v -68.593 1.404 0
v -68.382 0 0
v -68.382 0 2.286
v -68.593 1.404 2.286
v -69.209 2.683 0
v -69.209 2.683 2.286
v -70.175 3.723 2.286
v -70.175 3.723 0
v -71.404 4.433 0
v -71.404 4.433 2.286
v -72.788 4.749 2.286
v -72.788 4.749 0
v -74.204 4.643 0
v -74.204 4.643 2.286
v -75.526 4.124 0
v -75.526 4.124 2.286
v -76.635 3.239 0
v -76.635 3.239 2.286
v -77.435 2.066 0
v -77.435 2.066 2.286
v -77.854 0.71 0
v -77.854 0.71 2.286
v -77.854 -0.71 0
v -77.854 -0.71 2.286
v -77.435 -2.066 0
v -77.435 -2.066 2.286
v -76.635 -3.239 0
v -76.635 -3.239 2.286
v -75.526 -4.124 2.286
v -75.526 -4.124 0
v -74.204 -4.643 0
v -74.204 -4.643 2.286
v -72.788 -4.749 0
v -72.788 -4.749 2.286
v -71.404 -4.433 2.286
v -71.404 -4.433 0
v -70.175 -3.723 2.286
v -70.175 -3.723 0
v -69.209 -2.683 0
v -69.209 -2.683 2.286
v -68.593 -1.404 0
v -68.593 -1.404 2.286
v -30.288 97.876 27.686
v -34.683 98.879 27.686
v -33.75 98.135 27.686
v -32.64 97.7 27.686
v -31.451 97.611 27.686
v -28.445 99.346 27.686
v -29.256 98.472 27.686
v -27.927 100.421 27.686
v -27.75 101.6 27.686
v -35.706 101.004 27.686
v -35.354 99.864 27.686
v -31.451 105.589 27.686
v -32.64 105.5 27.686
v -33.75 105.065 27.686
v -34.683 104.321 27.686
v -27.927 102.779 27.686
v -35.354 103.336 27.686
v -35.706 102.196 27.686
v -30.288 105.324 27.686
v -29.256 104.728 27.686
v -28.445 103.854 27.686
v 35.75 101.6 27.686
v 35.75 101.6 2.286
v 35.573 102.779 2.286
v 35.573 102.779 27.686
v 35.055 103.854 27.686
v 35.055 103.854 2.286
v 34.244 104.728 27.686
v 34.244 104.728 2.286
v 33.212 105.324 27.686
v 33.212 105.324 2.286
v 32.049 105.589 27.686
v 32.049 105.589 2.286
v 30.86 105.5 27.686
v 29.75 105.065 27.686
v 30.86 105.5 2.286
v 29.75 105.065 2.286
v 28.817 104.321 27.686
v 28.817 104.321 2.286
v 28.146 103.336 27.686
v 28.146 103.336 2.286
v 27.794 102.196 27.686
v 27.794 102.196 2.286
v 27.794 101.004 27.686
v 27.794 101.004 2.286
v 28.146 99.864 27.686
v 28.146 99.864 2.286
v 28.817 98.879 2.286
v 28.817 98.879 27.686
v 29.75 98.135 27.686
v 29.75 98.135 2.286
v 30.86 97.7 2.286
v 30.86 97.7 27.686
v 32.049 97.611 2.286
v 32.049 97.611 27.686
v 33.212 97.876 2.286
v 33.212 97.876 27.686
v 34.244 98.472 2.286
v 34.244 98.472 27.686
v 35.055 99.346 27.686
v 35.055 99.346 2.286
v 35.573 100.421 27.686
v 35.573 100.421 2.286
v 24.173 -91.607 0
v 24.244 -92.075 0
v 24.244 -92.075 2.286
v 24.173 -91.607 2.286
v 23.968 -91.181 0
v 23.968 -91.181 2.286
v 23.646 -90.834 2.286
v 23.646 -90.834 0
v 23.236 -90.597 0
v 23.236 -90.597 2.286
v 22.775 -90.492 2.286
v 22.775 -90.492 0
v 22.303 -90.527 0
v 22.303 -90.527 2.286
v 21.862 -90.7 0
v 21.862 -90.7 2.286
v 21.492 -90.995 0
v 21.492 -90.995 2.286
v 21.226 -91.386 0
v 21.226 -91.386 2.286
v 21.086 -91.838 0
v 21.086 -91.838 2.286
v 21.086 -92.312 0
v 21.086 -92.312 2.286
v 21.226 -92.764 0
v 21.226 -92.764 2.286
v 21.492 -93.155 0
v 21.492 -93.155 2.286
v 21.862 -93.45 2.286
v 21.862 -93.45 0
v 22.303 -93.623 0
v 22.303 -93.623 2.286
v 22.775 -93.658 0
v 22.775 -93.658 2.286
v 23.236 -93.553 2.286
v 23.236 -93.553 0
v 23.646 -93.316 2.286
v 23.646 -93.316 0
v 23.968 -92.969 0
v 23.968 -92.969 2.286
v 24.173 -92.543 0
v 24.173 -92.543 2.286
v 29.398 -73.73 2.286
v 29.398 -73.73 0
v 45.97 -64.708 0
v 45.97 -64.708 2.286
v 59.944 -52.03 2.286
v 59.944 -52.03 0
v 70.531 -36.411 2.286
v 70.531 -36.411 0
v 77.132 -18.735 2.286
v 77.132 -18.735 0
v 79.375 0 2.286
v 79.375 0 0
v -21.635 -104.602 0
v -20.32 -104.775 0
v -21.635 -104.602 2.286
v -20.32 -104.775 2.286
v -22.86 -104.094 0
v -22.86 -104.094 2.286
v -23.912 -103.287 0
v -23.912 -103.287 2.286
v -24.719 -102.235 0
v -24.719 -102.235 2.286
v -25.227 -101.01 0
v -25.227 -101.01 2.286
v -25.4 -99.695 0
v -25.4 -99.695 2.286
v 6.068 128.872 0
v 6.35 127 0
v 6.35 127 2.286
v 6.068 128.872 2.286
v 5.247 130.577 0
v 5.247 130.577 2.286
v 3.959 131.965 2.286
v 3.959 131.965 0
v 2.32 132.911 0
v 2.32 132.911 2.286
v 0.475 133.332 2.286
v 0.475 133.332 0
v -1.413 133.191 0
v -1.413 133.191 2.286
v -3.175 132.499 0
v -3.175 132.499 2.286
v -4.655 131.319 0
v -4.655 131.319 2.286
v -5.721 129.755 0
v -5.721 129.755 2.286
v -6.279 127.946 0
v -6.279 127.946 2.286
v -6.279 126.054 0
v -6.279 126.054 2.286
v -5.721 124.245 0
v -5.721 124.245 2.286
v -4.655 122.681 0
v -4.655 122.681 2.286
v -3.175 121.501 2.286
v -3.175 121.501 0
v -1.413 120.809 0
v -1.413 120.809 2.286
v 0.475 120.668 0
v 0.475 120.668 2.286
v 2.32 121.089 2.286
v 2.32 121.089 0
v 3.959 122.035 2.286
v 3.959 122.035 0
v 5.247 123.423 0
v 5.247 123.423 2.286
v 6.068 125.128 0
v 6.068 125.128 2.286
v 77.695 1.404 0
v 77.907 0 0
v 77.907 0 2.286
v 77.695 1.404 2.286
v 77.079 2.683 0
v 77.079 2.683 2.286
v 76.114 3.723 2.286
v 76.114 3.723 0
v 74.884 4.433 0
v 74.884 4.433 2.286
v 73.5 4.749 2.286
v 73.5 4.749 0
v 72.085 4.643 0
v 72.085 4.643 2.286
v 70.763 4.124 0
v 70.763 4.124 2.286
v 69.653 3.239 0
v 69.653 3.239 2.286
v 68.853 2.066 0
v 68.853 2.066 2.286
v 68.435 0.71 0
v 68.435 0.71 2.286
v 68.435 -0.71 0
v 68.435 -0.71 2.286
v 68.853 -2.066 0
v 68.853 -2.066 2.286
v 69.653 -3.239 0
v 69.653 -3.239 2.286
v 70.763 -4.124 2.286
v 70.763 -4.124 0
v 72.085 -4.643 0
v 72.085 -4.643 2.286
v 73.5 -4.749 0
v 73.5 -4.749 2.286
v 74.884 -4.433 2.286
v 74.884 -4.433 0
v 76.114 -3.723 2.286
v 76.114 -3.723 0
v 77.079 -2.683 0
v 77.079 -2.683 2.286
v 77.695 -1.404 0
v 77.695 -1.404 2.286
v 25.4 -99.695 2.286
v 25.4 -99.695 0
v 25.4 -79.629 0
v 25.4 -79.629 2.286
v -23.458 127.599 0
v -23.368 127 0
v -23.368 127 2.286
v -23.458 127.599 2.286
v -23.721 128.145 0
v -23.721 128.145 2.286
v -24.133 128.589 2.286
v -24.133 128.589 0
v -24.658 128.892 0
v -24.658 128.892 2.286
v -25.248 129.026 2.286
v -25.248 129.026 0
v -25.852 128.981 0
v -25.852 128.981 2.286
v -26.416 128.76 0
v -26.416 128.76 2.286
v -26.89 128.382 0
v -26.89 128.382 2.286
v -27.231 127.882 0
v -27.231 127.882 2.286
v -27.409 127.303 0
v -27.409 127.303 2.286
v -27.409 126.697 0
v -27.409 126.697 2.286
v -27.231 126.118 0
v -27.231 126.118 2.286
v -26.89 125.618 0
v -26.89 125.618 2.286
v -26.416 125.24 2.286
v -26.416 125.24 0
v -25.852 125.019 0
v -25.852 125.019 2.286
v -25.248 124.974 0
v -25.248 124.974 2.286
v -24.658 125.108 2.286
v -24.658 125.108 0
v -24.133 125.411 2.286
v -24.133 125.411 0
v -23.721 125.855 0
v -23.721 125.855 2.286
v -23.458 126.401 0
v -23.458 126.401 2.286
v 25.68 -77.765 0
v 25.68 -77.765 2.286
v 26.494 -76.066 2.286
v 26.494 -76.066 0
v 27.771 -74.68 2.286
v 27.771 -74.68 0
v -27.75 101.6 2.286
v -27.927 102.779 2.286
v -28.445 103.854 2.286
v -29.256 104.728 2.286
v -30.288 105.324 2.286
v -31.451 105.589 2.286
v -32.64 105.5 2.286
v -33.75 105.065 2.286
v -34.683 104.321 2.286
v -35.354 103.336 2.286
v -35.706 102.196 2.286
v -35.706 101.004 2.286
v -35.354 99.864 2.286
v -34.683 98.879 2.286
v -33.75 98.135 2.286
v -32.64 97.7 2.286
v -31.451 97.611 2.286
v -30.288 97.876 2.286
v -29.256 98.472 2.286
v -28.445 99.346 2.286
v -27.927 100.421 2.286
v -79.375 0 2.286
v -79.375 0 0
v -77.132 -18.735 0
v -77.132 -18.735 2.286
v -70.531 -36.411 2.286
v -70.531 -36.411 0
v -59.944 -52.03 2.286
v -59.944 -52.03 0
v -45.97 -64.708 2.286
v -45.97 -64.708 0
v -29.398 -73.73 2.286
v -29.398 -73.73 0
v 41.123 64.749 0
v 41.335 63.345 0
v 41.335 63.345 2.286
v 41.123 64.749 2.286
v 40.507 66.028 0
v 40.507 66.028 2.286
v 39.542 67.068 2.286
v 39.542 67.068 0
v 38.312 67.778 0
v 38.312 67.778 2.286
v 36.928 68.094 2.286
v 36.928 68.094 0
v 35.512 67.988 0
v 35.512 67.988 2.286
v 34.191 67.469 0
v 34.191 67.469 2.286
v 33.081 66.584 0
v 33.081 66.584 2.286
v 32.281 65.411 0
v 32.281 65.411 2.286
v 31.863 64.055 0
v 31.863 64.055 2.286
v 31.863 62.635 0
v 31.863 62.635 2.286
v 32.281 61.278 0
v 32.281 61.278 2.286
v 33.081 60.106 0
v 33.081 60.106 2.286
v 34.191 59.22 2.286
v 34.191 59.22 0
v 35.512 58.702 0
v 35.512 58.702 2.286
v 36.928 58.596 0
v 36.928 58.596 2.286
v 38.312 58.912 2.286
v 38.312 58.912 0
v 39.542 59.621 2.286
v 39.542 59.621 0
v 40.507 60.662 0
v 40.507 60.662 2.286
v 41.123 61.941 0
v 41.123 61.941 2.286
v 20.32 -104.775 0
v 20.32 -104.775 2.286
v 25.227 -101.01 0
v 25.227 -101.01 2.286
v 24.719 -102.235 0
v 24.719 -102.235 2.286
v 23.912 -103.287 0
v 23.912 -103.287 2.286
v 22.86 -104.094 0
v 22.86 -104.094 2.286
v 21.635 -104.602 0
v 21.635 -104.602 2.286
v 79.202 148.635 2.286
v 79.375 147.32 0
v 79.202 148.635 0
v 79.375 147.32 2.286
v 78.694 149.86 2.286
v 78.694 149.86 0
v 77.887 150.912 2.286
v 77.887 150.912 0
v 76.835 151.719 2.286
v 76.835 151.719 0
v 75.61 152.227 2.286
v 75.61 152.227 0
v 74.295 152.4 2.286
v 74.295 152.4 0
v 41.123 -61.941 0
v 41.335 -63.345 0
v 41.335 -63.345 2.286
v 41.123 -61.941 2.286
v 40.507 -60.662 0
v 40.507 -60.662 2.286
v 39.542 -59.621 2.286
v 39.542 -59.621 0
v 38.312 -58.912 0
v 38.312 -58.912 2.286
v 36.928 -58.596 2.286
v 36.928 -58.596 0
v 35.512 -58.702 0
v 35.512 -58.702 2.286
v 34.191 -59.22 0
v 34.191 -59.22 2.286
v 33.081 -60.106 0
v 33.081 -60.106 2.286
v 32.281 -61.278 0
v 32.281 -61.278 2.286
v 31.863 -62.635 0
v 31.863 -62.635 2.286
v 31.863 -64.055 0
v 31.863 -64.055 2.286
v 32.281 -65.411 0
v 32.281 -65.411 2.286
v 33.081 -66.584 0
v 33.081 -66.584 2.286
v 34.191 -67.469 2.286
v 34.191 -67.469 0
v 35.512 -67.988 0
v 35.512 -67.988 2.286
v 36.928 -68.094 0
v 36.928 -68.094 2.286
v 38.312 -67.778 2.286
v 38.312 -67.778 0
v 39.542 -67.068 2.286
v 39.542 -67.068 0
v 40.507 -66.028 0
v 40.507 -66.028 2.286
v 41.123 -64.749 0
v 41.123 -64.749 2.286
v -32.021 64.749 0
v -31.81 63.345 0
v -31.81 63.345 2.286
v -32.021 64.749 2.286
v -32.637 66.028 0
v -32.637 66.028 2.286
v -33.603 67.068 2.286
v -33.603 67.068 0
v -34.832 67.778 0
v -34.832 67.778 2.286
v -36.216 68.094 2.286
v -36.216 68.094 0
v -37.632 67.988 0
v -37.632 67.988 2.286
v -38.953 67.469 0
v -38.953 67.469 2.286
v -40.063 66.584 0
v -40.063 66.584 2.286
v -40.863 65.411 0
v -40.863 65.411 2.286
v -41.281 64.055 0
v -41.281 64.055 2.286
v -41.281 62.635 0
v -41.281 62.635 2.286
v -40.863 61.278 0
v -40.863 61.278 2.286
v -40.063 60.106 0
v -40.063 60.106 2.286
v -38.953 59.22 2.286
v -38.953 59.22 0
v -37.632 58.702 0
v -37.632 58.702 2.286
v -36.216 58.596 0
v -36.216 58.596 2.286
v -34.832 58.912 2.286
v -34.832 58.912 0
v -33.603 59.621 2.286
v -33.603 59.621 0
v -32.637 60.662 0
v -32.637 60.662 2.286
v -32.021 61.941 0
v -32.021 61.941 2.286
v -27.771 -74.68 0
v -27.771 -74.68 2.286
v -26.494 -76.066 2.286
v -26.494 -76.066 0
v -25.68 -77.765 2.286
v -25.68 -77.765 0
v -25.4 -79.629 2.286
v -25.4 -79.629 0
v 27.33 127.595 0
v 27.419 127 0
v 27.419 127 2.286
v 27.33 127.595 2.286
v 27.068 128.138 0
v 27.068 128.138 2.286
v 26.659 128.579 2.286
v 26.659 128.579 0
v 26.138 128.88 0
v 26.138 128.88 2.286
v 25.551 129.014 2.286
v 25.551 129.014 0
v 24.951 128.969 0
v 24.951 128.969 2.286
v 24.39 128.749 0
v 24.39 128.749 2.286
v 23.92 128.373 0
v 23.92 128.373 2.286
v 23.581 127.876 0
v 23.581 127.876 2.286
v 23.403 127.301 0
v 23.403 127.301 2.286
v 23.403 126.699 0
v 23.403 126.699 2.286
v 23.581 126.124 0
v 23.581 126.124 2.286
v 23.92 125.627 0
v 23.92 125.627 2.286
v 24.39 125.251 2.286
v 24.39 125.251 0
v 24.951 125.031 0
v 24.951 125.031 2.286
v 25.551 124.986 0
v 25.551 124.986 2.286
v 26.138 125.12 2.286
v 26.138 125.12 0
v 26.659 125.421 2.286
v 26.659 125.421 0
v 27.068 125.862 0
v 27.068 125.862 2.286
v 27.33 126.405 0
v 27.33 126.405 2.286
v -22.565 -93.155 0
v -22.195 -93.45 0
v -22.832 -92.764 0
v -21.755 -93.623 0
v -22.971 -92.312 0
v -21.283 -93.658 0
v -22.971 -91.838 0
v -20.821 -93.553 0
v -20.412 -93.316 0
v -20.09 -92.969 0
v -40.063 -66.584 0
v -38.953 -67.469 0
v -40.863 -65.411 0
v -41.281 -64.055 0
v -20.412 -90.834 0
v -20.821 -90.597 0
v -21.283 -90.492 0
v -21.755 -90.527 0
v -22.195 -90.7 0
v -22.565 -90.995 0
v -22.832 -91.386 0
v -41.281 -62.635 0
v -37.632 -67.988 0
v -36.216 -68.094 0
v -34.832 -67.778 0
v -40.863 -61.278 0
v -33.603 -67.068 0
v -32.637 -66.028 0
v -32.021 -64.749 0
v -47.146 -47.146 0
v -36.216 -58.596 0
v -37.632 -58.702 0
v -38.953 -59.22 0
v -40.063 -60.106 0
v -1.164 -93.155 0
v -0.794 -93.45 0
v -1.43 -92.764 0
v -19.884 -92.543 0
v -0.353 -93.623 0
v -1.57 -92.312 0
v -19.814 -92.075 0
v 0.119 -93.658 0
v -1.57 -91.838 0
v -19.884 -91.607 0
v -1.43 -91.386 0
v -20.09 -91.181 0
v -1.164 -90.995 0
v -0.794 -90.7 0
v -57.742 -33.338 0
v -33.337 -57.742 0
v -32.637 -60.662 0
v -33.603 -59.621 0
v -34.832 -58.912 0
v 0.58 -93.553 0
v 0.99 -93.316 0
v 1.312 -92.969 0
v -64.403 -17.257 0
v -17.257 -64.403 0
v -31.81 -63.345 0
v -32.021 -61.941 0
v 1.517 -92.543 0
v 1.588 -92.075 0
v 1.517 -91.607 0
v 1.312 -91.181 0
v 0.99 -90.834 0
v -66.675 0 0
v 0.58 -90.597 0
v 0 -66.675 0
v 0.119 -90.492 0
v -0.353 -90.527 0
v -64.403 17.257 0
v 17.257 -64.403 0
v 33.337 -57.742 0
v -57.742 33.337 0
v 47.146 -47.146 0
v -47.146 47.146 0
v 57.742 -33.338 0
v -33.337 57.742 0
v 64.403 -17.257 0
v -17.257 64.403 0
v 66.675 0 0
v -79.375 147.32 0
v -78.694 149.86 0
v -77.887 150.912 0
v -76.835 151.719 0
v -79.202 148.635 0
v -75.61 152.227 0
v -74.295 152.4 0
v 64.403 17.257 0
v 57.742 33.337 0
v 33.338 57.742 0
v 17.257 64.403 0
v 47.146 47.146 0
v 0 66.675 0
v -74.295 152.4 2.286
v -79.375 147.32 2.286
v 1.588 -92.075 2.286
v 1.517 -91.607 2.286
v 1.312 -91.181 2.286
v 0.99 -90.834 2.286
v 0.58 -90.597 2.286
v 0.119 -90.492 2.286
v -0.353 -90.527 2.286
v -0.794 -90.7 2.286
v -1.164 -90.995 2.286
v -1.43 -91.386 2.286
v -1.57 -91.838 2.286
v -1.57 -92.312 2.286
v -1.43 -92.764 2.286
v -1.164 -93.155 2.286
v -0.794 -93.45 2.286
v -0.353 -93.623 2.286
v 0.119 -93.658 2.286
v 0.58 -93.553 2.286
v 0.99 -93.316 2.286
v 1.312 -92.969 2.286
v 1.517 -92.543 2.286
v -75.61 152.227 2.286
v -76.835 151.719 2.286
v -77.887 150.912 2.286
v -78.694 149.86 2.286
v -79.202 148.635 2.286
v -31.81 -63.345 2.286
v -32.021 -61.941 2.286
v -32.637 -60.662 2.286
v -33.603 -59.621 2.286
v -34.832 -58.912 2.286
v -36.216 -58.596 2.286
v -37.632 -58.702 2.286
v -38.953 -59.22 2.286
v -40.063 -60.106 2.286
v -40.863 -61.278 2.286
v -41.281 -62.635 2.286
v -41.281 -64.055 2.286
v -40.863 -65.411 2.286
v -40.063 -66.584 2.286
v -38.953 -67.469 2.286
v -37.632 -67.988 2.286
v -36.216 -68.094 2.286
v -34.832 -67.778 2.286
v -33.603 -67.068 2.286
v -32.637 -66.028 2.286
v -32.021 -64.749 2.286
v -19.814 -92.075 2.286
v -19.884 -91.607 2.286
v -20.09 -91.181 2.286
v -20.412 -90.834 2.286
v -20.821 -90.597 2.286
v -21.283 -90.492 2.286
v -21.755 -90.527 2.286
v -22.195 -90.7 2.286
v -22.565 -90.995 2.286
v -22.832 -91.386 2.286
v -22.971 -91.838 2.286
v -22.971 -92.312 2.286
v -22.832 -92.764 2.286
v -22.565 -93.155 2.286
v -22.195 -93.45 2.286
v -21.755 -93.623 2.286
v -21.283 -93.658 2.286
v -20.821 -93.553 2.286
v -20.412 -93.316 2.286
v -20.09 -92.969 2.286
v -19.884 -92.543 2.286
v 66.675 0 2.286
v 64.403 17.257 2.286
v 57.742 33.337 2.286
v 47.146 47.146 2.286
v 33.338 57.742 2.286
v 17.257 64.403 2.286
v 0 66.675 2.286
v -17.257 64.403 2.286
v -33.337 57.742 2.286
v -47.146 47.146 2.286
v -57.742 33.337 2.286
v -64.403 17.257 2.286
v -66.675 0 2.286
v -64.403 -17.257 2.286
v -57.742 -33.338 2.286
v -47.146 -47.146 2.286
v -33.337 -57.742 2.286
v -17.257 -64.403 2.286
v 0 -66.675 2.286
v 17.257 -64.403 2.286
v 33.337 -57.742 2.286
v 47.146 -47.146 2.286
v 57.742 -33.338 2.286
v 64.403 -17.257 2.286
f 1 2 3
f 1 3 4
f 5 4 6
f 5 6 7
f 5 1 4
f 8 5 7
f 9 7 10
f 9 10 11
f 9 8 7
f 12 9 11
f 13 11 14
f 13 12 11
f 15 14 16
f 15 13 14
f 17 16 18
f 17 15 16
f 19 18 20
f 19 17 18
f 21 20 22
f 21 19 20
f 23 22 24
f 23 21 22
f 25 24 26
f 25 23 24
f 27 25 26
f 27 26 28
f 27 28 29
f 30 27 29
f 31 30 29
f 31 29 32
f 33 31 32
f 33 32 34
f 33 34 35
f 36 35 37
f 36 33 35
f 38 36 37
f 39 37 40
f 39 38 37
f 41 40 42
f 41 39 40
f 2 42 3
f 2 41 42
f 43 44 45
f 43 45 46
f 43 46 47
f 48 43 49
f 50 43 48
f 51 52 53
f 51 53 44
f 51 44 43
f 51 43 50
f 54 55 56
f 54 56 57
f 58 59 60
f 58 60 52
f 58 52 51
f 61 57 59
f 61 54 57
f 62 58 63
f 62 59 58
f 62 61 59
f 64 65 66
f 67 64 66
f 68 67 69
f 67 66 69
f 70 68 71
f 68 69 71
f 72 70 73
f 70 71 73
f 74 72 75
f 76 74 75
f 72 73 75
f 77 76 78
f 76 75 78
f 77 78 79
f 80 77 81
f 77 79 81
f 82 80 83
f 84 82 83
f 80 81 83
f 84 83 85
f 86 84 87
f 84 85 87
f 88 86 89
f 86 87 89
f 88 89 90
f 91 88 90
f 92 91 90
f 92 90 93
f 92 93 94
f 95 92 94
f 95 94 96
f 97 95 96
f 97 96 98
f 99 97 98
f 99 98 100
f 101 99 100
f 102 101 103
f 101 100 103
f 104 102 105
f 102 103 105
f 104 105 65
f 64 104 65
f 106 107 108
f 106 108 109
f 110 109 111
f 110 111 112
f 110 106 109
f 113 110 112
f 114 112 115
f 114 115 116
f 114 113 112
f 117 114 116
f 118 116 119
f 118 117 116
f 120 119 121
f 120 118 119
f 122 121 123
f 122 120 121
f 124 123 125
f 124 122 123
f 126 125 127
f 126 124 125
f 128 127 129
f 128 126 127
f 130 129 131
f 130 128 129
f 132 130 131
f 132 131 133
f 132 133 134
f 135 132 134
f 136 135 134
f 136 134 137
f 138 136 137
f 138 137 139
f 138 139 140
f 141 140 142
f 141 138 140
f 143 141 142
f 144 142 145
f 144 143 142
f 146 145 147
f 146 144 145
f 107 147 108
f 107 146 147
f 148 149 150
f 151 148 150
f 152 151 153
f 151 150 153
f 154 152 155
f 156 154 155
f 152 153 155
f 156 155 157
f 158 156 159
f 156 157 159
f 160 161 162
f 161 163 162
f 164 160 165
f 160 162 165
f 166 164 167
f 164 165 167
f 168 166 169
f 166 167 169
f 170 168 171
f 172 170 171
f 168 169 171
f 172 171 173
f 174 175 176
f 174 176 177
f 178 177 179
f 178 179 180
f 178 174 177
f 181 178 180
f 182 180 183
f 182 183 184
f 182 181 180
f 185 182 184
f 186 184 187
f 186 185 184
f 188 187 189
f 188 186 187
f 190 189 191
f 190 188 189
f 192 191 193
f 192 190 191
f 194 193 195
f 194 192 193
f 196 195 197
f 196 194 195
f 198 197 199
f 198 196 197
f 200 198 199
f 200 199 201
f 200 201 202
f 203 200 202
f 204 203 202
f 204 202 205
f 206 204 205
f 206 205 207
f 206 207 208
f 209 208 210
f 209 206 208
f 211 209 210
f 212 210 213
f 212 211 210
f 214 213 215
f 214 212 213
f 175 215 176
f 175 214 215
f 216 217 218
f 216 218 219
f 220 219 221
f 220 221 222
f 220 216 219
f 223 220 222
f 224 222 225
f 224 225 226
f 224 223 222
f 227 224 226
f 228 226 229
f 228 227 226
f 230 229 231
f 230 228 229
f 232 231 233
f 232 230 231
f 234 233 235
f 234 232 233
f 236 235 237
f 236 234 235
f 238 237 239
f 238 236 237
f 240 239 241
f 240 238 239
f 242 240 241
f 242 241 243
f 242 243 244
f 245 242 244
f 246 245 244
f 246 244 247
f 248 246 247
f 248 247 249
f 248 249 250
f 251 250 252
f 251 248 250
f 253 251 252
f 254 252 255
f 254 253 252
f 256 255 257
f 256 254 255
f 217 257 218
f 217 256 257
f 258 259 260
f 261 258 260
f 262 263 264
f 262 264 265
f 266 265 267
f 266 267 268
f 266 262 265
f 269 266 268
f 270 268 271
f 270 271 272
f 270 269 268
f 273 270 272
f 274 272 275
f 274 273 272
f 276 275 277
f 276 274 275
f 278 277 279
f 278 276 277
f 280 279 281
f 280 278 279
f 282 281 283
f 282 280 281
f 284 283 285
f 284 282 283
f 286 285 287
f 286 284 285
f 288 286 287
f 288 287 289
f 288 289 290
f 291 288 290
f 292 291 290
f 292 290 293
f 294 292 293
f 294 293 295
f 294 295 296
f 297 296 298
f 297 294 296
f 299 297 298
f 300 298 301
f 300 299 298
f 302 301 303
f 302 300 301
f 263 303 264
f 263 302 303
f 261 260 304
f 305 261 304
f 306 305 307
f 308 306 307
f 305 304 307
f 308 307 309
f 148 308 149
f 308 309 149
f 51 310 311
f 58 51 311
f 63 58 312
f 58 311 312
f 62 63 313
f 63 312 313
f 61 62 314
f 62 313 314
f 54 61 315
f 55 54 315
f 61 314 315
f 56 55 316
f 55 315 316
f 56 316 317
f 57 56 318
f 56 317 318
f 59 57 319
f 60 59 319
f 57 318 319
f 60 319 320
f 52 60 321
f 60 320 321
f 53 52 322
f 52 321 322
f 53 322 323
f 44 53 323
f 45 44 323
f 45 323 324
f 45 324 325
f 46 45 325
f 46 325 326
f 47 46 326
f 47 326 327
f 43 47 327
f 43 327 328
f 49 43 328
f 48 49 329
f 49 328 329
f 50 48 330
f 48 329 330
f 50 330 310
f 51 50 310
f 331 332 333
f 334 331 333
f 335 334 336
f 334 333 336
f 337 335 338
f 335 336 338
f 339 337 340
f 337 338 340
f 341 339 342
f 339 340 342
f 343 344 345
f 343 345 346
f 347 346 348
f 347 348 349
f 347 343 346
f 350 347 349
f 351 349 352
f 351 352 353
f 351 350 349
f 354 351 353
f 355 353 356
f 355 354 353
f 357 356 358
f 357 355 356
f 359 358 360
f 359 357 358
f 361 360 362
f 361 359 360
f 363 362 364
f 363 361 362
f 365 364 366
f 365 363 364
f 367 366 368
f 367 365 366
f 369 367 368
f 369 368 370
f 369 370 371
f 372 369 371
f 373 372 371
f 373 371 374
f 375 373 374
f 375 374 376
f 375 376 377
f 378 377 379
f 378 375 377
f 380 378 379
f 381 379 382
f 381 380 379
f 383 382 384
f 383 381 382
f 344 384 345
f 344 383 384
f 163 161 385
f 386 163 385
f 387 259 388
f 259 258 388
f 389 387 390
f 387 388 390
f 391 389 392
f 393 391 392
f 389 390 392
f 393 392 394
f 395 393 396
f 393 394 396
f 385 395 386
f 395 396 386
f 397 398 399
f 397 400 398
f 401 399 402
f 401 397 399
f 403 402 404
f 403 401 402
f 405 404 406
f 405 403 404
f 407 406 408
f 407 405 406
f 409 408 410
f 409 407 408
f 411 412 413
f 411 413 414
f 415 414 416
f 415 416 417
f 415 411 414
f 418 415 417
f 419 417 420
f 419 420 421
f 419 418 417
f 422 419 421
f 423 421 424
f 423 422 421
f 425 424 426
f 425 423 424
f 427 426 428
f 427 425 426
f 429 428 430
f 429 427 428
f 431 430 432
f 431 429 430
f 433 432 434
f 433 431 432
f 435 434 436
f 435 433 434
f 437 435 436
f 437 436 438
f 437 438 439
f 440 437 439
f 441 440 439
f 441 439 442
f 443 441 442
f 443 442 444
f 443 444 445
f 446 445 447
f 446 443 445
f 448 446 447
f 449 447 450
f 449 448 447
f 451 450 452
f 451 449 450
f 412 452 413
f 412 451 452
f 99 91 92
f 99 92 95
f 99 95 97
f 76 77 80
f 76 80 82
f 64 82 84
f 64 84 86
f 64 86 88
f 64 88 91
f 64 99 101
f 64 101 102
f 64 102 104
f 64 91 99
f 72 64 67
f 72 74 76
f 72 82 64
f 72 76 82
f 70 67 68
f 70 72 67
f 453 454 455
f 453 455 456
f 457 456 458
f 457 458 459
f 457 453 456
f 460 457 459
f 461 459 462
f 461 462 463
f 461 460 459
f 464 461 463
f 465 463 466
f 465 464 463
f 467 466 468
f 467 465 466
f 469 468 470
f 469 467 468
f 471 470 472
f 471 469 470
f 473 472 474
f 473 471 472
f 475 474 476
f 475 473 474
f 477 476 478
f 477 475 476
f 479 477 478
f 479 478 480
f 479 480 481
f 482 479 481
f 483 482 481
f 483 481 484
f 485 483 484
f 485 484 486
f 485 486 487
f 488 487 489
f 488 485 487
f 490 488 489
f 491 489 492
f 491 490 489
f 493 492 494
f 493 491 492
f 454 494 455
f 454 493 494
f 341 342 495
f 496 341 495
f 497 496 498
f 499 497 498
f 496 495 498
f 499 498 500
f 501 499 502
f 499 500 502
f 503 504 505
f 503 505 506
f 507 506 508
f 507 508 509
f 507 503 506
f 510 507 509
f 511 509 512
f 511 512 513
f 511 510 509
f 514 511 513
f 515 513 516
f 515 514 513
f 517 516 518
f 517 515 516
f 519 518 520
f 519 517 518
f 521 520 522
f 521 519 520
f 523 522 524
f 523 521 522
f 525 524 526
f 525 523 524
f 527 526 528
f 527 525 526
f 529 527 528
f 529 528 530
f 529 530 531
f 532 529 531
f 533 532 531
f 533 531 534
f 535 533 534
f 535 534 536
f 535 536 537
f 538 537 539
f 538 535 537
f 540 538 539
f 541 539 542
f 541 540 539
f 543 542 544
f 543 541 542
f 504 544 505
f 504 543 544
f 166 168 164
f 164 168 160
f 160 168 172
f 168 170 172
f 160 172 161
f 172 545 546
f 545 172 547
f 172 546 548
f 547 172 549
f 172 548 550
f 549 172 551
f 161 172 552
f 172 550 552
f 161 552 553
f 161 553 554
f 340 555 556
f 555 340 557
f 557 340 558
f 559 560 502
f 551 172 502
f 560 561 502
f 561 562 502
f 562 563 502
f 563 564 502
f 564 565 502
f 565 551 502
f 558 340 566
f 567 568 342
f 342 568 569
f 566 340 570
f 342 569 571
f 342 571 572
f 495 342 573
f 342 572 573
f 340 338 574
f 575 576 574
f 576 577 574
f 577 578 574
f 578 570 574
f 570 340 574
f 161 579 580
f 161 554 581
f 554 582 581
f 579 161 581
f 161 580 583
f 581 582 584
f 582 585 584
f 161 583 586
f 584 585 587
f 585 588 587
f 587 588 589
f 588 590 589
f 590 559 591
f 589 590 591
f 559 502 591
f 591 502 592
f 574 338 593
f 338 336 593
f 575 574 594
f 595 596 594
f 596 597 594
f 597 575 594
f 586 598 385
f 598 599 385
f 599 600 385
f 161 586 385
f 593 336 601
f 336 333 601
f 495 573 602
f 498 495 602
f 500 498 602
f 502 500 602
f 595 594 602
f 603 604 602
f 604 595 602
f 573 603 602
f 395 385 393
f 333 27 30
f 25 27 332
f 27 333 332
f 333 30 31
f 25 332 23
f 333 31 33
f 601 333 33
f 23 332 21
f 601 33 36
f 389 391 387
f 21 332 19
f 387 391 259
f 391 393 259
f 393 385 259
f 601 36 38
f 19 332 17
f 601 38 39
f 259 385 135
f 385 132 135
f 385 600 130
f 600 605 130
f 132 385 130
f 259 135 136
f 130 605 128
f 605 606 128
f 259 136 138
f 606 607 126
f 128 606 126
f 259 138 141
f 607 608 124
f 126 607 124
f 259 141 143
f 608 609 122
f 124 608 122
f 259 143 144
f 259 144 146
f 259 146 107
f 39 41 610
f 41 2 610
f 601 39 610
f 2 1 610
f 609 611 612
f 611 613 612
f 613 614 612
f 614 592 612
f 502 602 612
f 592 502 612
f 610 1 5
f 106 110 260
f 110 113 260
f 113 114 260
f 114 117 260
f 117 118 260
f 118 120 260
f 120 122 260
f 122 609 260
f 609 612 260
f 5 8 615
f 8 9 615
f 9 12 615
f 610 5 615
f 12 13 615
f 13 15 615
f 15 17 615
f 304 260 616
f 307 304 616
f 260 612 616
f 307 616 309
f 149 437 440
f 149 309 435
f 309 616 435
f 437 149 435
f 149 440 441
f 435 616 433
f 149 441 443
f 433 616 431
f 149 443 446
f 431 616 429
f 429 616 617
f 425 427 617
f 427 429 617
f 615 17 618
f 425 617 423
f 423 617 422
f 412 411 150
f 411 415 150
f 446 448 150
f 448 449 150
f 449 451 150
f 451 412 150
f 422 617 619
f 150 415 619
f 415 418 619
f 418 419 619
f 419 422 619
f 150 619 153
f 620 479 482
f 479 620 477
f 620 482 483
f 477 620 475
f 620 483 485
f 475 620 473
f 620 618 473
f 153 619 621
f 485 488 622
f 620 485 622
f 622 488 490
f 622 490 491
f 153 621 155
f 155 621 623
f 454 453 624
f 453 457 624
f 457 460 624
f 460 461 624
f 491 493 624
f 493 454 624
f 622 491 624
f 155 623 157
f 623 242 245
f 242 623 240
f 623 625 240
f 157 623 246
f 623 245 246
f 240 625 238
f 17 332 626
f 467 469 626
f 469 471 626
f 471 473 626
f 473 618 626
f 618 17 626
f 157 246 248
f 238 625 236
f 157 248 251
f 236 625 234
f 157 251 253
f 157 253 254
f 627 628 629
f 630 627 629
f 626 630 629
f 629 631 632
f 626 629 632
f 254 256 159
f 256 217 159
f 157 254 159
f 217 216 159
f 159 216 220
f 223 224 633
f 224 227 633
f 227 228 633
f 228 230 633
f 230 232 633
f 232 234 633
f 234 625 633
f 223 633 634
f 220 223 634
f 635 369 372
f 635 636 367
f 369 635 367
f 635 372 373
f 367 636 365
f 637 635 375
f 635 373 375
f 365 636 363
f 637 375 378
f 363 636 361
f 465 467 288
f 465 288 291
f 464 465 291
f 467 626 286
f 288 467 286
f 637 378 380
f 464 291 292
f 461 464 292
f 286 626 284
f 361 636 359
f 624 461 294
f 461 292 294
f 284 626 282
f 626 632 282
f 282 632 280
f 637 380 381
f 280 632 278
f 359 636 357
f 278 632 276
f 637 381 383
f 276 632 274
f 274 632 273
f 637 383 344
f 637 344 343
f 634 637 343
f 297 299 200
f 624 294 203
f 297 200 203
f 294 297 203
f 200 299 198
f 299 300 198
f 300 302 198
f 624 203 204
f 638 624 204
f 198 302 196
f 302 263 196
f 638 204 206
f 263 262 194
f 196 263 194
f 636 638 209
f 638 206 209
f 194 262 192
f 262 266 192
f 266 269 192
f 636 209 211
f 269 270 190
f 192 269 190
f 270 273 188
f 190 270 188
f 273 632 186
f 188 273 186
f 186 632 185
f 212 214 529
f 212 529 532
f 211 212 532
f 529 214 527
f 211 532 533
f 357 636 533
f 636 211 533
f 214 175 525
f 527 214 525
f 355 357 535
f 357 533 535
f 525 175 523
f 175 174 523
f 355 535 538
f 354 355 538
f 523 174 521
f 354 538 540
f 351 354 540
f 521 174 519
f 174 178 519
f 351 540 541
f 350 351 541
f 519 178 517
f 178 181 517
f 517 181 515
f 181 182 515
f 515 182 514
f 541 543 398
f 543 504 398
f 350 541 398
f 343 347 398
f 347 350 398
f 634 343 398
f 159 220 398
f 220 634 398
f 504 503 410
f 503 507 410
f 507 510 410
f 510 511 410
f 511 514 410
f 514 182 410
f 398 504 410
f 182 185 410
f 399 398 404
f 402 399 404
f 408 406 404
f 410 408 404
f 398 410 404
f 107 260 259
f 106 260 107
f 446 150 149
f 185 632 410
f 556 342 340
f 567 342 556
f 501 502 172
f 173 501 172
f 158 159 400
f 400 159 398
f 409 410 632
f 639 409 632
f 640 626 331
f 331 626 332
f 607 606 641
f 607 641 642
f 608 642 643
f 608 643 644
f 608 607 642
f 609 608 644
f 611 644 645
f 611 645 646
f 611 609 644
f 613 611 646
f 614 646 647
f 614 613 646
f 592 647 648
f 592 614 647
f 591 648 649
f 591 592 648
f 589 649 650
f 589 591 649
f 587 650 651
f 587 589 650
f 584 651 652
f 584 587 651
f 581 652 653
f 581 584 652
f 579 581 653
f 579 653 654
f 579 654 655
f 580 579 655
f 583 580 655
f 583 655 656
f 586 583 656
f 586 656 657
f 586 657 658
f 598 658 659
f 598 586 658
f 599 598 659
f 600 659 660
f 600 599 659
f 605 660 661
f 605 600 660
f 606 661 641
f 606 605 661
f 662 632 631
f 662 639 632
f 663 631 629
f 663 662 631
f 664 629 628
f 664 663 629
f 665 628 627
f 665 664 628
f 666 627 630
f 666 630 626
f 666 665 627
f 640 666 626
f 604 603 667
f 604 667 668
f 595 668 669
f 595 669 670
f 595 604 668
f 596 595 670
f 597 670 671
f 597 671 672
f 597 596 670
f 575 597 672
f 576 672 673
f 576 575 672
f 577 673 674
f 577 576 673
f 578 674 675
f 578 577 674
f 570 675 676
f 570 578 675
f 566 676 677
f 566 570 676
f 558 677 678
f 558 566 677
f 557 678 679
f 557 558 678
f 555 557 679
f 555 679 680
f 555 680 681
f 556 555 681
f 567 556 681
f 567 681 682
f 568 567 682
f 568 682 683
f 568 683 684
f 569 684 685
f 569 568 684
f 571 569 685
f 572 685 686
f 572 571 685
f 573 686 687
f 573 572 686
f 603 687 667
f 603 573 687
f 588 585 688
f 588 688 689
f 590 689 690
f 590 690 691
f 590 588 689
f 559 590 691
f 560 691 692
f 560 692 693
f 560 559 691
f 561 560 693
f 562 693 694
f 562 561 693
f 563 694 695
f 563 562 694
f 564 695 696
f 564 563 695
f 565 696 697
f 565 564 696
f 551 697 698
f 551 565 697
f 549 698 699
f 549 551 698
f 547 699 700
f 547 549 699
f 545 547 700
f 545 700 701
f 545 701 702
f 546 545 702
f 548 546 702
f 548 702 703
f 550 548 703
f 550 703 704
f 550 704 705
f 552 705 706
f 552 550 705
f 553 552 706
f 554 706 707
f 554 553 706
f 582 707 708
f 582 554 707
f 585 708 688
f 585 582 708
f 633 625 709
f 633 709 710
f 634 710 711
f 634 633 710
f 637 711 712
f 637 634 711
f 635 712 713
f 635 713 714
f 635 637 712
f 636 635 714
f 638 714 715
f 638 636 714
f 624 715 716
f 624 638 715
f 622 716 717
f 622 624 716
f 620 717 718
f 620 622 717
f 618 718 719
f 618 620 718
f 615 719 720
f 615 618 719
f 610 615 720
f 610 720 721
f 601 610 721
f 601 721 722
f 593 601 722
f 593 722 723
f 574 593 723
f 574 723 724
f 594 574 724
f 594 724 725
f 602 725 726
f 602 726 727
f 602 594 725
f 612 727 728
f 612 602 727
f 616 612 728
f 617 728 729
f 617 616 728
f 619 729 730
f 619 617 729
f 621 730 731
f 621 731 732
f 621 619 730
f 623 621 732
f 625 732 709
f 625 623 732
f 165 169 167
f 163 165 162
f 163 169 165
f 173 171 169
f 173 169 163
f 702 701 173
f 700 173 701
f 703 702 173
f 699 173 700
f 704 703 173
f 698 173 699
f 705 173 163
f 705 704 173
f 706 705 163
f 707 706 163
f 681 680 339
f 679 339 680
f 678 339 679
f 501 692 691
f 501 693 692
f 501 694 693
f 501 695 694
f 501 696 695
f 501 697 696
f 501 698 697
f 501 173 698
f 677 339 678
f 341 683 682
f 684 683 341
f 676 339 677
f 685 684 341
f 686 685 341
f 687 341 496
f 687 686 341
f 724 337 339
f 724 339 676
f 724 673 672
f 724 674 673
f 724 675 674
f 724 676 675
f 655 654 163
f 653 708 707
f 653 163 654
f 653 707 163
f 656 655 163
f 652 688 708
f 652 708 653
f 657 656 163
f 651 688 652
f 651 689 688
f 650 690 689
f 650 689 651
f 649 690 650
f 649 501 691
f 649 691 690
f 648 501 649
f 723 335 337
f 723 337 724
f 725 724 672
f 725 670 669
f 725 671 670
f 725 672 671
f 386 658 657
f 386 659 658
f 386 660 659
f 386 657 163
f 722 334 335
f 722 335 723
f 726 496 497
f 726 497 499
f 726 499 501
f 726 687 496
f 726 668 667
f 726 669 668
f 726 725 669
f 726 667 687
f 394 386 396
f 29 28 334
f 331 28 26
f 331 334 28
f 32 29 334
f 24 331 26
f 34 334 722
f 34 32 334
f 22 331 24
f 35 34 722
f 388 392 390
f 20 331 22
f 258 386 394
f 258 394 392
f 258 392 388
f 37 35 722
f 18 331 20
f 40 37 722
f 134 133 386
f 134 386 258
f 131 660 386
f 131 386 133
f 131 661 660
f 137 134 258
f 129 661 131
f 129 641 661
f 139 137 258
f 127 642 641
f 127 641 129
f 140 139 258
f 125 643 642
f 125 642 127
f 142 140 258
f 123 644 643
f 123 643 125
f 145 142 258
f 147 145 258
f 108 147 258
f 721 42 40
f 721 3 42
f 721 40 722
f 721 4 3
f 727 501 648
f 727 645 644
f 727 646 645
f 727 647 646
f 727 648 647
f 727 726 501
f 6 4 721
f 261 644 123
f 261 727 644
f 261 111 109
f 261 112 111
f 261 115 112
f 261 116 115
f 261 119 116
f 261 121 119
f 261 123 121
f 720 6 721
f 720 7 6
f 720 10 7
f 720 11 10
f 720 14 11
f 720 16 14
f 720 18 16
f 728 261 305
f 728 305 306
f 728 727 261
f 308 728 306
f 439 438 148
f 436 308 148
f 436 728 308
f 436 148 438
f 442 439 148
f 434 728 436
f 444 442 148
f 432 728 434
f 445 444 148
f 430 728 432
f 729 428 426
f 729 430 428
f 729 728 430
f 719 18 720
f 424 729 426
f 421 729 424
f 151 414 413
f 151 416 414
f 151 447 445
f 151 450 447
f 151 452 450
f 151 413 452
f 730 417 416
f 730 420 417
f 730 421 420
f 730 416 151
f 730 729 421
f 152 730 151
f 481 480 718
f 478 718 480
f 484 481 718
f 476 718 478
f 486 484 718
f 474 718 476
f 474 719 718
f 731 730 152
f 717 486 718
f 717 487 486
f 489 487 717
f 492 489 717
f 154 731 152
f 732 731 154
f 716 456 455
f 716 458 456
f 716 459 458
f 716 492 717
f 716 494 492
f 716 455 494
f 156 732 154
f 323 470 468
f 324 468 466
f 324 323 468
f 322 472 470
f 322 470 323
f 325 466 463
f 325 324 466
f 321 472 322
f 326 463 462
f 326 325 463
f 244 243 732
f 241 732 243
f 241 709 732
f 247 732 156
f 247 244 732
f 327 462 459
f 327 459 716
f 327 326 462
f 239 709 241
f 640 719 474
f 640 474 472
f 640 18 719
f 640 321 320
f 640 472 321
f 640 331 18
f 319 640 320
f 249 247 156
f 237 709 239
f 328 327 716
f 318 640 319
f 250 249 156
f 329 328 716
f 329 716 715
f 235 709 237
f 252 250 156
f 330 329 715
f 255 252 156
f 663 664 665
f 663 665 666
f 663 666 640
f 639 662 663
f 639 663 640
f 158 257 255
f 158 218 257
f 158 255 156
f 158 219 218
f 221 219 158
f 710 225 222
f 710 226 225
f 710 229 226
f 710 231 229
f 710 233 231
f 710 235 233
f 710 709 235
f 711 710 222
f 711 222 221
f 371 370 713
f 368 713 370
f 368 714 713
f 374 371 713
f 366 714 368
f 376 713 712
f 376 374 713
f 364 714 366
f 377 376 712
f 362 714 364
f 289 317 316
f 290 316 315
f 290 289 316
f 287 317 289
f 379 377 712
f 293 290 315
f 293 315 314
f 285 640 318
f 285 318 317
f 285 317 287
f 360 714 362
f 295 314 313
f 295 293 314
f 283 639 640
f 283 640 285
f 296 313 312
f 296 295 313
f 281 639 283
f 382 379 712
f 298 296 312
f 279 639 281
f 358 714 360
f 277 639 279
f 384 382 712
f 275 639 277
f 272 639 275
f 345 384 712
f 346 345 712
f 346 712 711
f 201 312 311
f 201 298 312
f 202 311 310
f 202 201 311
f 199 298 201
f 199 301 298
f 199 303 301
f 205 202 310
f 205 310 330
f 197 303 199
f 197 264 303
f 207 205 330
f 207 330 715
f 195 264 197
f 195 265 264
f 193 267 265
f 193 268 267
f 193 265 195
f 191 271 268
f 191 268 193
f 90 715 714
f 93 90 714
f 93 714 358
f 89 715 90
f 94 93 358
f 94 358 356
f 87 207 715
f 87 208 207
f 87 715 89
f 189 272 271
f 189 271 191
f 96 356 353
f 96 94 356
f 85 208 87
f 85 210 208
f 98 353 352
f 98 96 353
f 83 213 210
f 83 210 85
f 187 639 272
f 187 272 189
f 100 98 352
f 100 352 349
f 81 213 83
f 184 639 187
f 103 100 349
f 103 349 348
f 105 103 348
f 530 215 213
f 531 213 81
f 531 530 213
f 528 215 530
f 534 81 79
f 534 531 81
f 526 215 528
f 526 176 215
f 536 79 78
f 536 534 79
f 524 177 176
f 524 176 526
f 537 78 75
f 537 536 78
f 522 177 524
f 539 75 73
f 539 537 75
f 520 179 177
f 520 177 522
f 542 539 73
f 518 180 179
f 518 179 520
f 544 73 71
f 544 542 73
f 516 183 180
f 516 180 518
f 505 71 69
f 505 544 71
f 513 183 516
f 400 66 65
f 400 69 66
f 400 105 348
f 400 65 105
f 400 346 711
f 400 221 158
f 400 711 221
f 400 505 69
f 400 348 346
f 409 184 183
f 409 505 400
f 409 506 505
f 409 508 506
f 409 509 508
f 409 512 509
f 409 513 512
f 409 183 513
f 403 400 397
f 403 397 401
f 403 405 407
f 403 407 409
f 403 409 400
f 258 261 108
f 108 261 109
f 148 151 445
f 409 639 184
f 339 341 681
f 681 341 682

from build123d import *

# Parameters (mm, degrees)
F0_R     = 4.7625
F0_R_2   = 66.675
F0_R_3   = 2.032
F0_R_4   = 6.35
F0_R_5   = 2.0193
F0_R_6   = 1.5875
F1_DEPTH = 2.286
F2_R     = 5.08
F3_R     = 5.08
F4_R     = 4.0005
F5_DEPTH = 25.4


with BuildPart() as f1:
    # F0 (on Top) → F1 (new body)
    with BuildSketch(Plane.XY):
        with BuildLine():
            ThreePointArc((79.375, 0), (0, 79.375), (-79.375, 0))
            ThreePointArc((-79.375, 0), (-65.703381, -44.536011), (-29.398148, -73.73018))
            ThreePointArc((-29.398148, -73.73018), (0, -79.375), (29.398148, -73.73018))
            ThreePointArc((29.398148, -73.73018), (65.703381, -44.536011), (79.375, 0))
        make_face()
        with Locations((-36.572162, -63.344843)):
            Circle(F0_R, mode=Mode.SUBTRACT)
        with Locations((-73.144324, 0)):
            Circle(F0_R, mode=Mode.SUBTRACT)
        with Locations((36.572162, -63.344843)):
            Circle(F0_R, mode=Mode.SUBTRACT)
        Circle(F0_R_2, mode=Mode.SUBTRACT)
        with Locations((73.144324, 0)):
            Circle(F0_R, mode=Mode.SUBTRACT)
        with Locations((-36.572162, 63.344843)):
            Circle(F0_R, mode=Mode.SUBTRACT)
        with Locations((36.572162, 63.344843)):
            Circle(F0_R, mode=Mode.SUBTRACT)
        with BuildLine():
            Line((-79.375, 152.4), (-79.375, 0))
            ThreePointArc((-79.375, 0), (0, 79.375), (79.375, 0))
            Line((79.375, 0), (79.375, 152.4))
            Line((79.375, 152.4), (-79.375, 152.4))
        make_face()
        with Locations((-25.4, 127)):
            Circle(F0_R_3, mode=Mode.SUBTRACT)
        with Locations((0, 127)):
            Circle(F0_R_4, mode=Mode.SUBTRACT)
        with Locations((25.4, 127)):
            Circle(F0_R_5, mode=Mode.SUBTRACT)
        with BuildLine():
            ThreePointArc((29.398148, -73.73018), (0, -79.375), (-29.398148, -73.73018))
            ThreePointArc((-29.398148, -73.73018), (-26.493729, -76.065714), (-25.4, -79.628595))
            Line((-25.4, -79.628595), (-25.4, -104.775))
            Line((-25.4, -104.775), (0, -104.775))
            Line((0, -104.775), (25.4, -104.775))
            Line((25.4, -104.775), (25.4, -79.628595))
            ThreePointArc((25.4, -79.628595), (26.493729, -76.065714), (29.398148, -73.73018))
        make_face()
        with Locations((-21.401391, -92.075)):
            Circle(F0_R_6, mode=Mode.SUBTRACT)
        with Locations((0, -92.075)):
            Circle(F0_R_6, mode=Mode.SUBTRACT)
        with Locations((22.656089, -92.075)):
            Circle(F0_R_6, mode=Mode.SUBTRACT)
    extrude(amount=F1_DEPTH)

    # F2
    f2_edges = [f1.edges().sort_by_distance(p)[0] for p in [
        (-79.375, 152.4, 1.143),
        (79.375, 152.4, 1.143),
    ]]
    fillet(f2_edges, radius=F2_R)

    # F3
    f3_edges = [f1.edges().sort_by_distance(p)[0] for p in [
        (25.4, -104.775, 1.143),
        (-25.4, -104.775, 1.143),
    ]]
    fillet(f3_edges, radius=F3_R)

    # F4 (on face) → F5 (join)
    with BuildSketch(Plane.XY.offset(2.286)):
        with Locations((-31.75, 101.6)):
            Circle(F4_R)
        with Locations((31.75, 101.6)):
            Circle(F4_R)
    extrude(amount=F5_DEPTH)


solid = f1.part
